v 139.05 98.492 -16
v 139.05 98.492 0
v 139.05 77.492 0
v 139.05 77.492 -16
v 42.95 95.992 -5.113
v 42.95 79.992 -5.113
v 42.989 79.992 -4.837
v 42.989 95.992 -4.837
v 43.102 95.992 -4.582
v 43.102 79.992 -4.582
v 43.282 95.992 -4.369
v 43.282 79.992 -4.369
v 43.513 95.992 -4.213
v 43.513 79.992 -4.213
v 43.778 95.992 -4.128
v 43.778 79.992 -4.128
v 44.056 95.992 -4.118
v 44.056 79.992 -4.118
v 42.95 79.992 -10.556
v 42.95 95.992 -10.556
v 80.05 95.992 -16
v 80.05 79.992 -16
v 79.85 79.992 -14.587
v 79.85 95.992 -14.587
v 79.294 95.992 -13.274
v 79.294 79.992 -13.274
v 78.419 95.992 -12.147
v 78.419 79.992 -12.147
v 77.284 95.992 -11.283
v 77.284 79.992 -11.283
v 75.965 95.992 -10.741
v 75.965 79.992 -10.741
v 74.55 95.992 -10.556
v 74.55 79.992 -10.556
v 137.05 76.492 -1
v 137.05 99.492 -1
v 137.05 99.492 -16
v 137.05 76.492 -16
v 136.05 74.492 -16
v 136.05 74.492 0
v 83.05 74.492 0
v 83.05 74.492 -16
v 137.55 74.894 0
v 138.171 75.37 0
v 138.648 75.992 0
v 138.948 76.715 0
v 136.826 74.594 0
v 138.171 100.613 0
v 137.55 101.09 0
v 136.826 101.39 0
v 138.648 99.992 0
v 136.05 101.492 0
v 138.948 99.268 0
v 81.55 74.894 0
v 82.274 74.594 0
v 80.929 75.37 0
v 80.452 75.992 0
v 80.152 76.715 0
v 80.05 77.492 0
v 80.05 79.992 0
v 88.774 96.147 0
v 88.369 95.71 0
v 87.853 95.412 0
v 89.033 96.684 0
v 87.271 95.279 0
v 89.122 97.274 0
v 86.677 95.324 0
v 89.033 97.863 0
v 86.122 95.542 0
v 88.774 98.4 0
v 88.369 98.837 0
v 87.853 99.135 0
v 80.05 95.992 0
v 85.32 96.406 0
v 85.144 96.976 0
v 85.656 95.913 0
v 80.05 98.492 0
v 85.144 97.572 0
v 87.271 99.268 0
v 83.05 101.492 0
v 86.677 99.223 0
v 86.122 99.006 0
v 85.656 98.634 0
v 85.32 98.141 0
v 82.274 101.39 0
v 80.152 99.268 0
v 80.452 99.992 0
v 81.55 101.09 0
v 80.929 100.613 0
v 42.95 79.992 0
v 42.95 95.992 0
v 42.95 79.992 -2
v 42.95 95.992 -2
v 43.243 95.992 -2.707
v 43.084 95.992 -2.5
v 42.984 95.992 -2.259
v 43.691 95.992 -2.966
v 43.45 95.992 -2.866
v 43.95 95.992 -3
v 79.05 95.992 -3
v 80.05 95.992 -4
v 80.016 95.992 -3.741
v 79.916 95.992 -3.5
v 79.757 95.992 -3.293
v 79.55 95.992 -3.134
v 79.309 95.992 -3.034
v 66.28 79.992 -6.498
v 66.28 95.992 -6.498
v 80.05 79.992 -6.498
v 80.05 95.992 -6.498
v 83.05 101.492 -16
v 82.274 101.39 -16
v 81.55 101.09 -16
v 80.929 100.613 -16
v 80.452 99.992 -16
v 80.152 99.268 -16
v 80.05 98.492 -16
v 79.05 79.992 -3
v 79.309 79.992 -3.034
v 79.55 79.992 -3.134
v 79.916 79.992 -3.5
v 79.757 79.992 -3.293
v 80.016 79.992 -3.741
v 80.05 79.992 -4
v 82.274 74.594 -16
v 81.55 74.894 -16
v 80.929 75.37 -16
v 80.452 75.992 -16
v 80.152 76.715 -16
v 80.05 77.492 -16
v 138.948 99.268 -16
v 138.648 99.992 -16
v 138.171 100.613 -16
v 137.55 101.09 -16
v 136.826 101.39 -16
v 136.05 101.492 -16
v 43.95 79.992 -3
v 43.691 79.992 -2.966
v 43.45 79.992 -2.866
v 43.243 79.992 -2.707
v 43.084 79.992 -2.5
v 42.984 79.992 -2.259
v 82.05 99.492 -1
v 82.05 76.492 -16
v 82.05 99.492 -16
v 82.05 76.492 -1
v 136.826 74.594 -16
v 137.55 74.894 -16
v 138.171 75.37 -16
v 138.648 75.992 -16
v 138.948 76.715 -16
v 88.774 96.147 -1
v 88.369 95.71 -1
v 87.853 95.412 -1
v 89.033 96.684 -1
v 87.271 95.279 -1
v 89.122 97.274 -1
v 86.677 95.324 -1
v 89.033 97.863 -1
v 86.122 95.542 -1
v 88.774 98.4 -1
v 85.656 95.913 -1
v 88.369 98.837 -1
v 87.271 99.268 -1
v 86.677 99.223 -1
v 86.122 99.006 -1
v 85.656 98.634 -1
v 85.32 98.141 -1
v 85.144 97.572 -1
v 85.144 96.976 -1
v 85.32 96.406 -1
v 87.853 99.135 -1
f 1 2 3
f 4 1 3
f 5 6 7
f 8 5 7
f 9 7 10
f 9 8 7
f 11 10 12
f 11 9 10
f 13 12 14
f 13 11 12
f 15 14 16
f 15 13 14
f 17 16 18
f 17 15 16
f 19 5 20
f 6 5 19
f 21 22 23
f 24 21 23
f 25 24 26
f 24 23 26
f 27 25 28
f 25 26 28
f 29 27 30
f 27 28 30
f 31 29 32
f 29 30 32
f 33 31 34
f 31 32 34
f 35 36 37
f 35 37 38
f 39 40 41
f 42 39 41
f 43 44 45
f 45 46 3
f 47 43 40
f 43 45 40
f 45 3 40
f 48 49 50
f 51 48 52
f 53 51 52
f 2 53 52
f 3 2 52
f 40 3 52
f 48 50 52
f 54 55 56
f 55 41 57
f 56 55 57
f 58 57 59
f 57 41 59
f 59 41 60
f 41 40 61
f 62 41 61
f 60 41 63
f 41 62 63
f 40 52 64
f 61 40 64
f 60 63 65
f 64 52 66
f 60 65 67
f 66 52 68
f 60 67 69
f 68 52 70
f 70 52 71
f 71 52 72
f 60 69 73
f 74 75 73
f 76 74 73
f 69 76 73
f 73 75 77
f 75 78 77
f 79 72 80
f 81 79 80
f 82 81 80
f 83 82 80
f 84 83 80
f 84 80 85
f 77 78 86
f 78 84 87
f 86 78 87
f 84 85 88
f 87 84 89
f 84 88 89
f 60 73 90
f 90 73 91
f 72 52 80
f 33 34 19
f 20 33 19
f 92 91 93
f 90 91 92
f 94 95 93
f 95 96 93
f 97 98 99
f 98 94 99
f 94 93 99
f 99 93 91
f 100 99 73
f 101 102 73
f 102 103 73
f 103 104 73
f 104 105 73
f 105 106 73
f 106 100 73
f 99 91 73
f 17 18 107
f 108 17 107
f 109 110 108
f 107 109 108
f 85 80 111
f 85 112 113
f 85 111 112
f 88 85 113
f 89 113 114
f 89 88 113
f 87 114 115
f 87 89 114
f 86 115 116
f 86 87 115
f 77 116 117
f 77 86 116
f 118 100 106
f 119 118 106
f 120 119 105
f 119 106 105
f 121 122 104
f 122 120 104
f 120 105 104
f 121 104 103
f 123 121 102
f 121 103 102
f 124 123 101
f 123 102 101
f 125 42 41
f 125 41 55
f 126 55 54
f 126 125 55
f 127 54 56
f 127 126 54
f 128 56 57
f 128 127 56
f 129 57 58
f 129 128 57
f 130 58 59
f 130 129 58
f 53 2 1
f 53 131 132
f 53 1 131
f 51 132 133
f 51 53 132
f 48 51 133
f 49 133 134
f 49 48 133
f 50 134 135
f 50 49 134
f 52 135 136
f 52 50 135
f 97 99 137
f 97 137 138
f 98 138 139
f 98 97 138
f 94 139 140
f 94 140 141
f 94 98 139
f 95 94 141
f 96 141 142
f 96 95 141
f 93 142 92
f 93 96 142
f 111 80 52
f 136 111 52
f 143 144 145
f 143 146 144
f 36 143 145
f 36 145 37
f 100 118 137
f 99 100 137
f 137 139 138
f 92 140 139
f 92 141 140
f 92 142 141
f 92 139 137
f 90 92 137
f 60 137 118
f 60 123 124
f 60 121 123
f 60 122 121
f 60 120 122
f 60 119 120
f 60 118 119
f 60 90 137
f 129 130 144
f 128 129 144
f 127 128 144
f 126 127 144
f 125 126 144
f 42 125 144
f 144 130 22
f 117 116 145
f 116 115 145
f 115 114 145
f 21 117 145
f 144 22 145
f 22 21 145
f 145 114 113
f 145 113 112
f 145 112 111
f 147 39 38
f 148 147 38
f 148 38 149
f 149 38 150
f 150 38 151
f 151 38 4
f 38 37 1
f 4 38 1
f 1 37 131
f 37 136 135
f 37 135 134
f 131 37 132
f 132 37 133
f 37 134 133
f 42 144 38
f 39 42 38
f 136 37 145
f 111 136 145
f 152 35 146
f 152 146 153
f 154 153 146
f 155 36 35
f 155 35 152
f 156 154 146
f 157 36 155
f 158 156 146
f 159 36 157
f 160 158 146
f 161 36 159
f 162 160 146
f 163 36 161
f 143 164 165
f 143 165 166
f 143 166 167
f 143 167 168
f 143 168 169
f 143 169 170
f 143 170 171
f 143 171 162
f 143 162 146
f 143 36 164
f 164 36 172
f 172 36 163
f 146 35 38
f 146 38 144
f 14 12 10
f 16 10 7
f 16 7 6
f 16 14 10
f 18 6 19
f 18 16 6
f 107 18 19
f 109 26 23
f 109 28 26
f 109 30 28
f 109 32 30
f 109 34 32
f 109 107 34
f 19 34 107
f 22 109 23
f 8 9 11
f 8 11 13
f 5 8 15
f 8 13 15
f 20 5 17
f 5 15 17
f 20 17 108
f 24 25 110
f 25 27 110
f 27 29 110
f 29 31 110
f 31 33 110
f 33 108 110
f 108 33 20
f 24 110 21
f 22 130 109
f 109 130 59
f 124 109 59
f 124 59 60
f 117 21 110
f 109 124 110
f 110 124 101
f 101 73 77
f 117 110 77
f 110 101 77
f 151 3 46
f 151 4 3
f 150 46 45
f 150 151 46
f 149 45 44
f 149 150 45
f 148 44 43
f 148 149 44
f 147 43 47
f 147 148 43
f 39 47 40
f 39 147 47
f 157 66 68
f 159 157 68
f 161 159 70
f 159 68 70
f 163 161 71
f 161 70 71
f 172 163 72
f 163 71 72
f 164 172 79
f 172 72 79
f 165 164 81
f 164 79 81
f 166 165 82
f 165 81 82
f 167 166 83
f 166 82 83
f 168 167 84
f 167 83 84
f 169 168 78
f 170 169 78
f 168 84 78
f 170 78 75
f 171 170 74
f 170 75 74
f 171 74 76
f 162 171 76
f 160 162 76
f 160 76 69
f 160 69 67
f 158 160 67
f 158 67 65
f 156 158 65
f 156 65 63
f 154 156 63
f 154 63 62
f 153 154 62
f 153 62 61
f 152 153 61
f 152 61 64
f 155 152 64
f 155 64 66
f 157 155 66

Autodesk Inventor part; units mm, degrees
ref_plane "YZ Plane" through (0, 0, 0) normal (1, 0, 0) x (0, 1, 0)
ref_plane "XZ Plane" through (0, 0, 0) normal (0, 1, 0) x (-1, 0, 0)
ref_plane "XY Plane" through (0, 0, 0) normal (0, 0, 1) x (1, 0, 0)
sketch "草图1" plane through (42.95, 80.9918, 0) normal (0, 0, -1) x (-1, 0, 0)
  line L0 (-94.1, 15) -> (0, 15)
  line L1 (0, 15) -> (0, -1)
  line L2 (0, -1) -> (-94.1, -1)
  line L3 (-94.1, -1) -> (-94.1, 15)
  line L4 (0, 0) -> (0, 14) projected
  line L5 (-94.1, 14) -> (-94.1, 0) projected
  line L6 (0, 14) -> (-94.1, 14) projected
  line L7 (-94.1, 0) -> (0, 0) projected
  line L8 (-94.1, 7) -> (0, 7)
  line L9 (-39.1, -4.5) -> (-94.1, -4.5)
  line L10 (-94.1, -4.5) -> (-94.1, 18.5)
  line L11 (-94.1, 18.5) -> (-39.1, 18.5)
  line L12 (-39.1, 18.5) -> (-39.1, -4.5)
  line L13 (-39.1, -4.5) -> (-94.1, 18.5) construction
  line L14 (-94.1, -4.5) -> (-39.1, 18.5) construction
  point P0 (42.95, -80.9918)
  point P1 (-66.6, 7)
  point P2 (-39.1, -1)
  point P3 (-39.1, 15)
  dimension "d0" = 1
  dimension "d1" = 1
  dimension "d2" = 23
  dimension "d3" = 55
extrude "拉伸1" add sketch "草图1" along normal blind 1
sketch "草图2" plane through (42.95, 80.9918, -1) normal (0, 0, -1) x (-1, 0, 0)
  line L0 (-74.55, 0) -> (-74.55, -4.5) projected
  line L1 (-39.1, 18.5) -> (-94.1, 18.5) projected
  line L2 (-94.1, -4.5) -> (-39.1, -4.5)
  line L3 (-39.1, -4.5) -> (-39.1, 18.5)
  line L4 (-39.1, 18.5) -> (-94.1, 18.5)
  line L5 (-94.1, 18.5) -> (-94.1, -4.5)
  line L6 (-96.1, -6.5) -> (-37.1, -6.5)
  line L7 (-37.1, -6.5) -> (-37.1, 20.5)
  line L8 (-37.1, 20.5) -> (-96.1, 20.5)
  line L9 (-96.1, 20.5) -> (-96.1, -6.5)
  point P0 (42.95, -80.9918)
  dimension "d6" = 2
extrude "拉伸2" add sketch "草图2" against normal up to surface (1 mm away) contours L3 L2 L5 L1 | L9 L8 L7 L6
extrude "拉伸3" add sketch "草图2" along normal blind 15
fillet "圆角1" radius 2 1 edges at (80.05, 87.9918, -1)
sketch "草图3" plane through (42.95, 80.9918, 0) normal (0, 0, 1) x (1, 0, 0)
  point P0 (-42.95, -80.9918)
fillet "圆角2" radius 3 4 edges at (80.05, 74.4918, -8) (80.05, 101.4918, -8) (139.05, 74.4918, -8) (139.05, 101.4918, -8)
sketch "草图4" plane through (42.95, 79.9918, -1) normal (0, -1, 0) x (1, 0, 0)
  line L0 (0, 1) -> (0, 0) projected
  line L1 (37.1, 1) -> (37.1, -15) projected
  line L2 (0, 0) -> (37.1, 0)
  line L3 (37.1, 0) -> (37.1, -9.5558)
  line L4 (37.1, -9.5558) -> (0, -9.5558)
  line L5 (0, -9.5558) -> (0, 0)
  point P0 (-42.95, 1)
  point P1 (37.1, 0)
extrude "拉伸4" add sketch "草图4" against normal up to surface (16 mm away)
fillet "圆角3" radius 5.5 1 edges at (80.05, 87.9918, -10.5558)
sketch "草图5" plane through (42.95, 79.9918, 0) normal (0, -1, 0) x (1, 0, 0)
  line L0 (0, 0) -> (37.1, 0) projected
  line L1 (0, 0) -> (37.1, 0)
  line L2 (37.1, 0) -> (37.1, -3)
  line L3 (37.1, -3) -> (0, -3)
  line L4 (0, -3) -> (0, 0)
  line L5 (37.1, 0) -> (37.1, -16)
  line L6 (0, -3) -> (37.2428, -3)
  line L7 (37.2428, -3) -> (37.2428, -6.4975)
  line L8 (37.2428, -6.4975) -> (0, -6.4975)
  line L9 (0, -6.4975) -> (0, -3)
  line L10 (0, 0) -> (0, -10.5558) projected
  line L11 (0, -4) -> (23.3302, -6.4975)
  point P0 (-42.95, 0)
  point P1 (0, -4)
  point P2 (37.1, -7.9715)
  point P3 (37.1, -3)
  point P4 (37.1, -6.4975)
  dimension "d16" = 3
  dimension "d20" = 1
extrude "拉伸5" cut sketch "草图5" against normal blind 61.75 contours L3 L5 L8 L11 L9
fillet "圆角4" radius 1 3 edges at (80.05, 87.9918, -3) (42.95, 87.9918, -4) (42.95, 87.9918, -3)
sketch "草图6" plane through (42.95, 80.9918, 0) normal (0, 0, 1) x (1, 0, 0)
  circle A0 centre (44.1719, 16.2818) radius 2
  point P0 (-42.95, -80.9918)
  dimension "d22" = 4
extrude "拉伸6" cut sketch "草图6" against normal blind 61.75
properties part number "obj_1_电池盒.STEP_3D 打印"
